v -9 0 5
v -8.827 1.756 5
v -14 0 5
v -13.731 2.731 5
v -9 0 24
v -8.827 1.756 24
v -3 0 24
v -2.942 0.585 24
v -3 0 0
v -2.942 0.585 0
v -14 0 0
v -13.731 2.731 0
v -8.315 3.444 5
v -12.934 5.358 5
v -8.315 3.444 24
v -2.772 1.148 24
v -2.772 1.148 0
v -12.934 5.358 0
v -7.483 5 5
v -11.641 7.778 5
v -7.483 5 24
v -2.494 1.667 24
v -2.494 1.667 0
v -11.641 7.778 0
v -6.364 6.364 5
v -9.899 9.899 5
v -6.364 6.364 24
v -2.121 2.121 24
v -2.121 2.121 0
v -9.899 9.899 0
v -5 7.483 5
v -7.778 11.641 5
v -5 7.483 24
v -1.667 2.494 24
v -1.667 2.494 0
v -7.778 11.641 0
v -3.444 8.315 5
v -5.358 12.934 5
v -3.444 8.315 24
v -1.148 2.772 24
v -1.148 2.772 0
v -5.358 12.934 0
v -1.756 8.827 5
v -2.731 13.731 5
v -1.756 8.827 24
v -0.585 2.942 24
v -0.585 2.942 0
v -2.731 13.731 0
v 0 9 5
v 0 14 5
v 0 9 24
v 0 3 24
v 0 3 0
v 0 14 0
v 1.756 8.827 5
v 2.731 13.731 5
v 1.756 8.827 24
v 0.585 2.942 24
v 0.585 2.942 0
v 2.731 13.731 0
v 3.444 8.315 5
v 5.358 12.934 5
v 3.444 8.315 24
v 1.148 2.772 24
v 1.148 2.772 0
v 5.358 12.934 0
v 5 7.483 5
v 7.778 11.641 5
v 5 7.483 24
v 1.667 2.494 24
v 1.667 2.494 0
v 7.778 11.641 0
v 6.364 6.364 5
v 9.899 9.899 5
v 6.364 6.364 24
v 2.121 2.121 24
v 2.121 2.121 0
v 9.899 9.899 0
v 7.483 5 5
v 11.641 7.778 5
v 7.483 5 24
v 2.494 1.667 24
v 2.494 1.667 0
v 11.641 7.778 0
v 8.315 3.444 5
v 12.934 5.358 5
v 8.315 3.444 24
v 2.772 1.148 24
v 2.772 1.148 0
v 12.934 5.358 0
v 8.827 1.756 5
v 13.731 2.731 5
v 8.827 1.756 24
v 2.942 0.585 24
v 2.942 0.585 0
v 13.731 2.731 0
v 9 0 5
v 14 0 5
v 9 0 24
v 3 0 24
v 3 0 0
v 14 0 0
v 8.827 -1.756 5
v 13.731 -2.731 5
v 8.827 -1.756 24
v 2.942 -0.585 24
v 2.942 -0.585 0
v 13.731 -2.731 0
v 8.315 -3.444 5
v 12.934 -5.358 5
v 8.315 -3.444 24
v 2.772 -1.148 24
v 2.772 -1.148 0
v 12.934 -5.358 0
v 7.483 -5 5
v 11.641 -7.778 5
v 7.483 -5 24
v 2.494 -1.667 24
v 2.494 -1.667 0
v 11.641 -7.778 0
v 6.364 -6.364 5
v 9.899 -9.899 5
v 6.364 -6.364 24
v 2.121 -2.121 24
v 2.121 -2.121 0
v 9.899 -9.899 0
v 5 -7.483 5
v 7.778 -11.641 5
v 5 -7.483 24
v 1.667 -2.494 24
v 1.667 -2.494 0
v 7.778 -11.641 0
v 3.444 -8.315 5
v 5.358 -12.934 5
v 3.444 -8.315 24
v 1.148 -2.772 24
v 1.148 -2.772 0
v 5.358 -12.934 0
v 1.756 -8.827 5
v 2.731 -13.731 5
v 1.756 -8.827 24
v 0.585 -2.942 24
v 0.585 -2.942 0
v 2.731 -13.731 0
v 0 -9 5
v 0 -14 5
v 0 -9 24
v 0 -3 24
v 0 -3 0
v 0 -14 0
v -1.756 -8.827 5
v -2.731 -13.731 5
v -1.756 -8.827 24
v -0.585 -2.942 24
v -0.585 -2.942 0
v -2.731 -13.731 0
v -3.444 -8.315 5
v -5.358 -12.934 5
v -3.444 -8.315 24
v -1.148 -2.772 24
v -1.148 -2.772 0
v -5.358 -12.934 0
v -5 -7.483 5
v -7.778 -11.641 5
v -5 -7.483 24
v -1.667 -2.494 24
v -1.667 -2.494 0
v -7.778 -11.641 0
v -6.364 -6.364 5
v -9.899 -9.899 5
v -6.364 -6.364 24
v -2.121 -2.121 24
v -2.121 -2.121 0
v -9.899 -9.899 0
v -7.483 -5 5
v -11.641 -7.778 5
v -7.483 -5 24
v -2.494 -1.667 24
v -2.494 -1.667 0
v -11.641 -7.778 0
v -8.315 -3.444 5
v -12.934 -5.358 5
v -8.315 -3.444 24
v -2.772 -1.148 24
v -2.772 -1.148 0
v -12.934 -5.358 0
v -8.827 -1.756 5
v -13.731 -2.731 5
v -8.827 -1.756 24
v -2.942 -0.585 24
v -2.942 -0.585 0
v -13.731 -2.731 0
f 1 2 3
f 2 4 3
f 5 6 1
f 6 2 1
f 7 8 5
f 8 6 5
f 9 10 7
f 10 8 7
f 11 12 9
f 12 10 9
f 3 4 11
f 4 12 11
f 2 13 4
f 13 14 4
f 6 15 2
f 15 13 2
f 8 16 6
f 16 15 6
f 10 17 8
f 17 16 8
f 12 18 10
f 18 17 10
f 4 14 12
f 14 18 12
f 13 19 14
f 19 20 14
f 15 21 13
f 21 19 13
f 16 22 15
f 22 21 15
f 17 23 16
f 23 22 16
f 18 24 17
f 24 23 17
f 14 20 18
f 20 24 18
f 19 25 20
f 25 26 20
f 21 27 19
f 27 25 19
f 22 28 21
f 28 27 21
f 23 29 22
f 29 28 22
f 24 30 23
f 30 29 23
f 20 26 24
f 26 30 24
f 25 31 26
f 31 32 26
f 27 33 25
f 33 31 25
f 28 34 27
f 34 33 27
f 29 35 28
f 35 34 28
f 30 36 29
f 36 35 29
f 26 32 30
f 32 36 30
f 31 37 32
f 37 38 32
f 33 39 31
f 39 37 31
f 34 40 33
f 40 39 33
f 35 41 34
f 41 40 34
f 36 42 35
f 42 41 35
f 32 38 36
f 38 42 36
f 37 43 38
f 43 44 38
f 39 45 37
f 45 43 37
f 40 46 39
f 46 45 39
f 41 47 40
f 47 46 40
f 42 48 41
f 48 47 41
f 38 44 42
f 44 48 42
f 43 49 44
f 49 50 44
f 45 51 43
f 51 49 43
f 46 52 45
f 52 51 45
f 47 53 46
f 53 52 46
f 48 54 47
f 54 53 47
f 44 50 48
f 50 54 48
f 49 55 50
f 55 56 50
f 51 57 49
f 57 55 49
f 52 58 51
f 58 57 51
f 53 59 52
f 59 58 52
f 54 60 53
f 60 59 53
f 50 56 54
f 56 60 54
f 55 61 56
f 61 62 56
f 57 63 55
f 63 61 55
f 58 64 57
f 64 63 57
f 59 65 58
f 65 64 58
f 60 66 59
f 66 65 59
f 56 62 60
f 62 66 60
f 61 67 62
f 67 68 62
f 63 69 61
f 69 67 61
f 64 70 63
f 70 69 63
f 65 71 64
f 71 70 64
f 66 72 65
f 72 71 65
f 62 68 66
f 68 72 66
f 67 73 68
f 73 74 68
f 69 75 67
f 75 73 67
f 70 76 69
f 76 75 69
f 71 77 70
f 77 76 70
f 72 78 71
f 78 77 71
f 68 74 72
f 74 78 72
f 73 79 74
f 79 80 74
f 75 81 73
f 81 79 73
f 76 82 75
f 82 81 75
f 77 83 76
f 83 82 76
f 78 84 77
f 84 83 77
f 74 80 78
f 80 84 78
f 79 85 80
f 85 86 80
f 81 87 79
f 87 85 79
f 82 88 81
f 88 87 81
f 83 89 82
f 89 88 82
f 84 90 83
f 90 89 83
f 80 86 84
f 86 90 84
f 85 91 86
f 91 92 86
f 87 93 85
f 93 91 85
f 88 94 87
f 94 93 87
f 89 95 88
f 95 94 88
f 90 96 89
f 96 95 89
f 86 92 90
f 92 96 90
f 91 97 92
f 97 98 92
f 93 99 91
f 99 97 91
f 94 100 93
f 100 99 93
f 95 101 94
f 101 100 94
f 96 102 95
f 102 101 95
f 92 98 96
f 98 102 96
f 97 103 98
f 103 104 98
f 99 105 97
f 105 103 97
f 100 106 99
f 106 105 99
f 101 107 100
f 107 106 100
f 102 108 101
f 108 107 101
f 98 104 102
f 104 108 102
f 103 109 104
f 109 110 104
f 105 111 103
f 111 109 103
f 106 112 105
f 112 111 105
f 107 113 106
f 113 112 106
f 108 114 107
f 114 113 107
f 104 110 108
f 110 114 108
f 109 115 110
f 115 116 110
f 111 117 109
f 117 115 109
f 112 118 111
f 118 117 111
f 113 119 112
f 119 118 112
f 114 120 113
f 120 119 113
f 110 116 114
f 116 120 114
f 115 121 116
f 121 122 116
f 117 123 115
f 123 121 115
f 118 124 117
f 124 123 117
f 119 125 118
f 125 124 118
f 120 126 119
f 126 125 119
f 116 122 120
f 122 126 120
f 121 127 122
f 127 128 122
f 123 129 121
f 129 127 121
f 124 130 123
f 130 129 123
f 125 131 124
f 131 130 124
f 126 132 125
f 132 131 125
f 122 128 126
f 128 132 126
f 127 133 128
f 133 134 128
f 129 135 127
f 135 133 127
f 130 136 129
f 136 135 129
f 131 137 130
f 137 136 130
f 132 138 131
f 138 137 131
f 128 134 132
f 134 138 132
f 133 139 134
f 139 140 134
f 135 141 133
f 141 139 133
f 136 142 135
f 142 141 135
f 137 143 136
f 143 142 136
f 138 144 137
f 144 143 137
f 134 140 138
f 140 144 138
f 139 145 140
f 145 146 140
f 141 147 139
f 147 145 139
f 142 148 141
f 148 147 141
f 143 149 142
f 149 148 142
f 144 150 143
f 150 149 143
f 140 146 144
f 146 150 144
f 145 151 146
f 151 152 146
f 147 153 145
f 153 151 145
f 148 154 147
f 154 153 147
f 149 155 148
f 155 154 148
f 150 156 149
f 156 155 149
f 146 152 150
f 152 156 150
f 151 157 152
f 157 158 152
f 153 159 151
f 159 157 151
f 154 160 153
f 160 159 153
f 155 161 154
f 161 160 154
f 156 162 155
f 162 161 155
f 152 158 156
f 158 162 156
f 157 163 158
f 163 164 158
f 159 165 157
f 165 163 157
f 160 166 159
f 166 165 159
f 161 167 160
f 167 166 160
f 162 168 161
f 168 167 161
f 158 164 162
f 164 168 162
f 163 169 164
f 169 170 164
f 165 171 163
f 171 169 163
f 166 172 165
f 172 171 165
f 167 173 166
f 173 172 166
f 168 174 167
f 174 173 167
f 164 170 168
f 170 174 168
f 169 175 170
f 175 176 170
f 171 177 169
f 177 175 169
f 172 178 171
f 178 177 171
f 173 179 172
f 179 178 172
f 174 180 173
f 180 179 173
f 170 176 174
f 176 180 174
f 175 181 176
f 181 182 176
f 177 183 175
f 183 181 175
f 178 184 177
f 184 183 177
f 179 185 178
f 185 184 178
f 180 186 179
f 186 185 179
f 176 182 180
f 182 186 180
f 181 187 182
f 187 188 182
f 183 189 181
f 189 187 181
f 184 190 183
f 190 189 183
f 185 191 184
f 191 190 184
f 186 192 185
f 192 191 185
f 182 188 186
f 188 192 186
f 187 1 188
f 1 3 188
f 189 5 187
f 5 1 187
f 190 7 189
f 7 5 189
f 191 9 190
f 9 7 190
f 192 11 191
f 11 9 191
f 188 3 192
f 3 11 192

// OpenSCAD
$fn = 32;

// ----------------------------------------------------------------------
// Arc stop: collar, 24 mm thick
// ----------------------------------------------------------------------

// --- parameters (mm) ---
revolve_angle = 360;      // full turn around the Z axis
profile_points = 6;       // points of the closed outline

profile = [[3, 0], [14, 0], [14, 5], [9, 5], [9, 24], [3, 24]];  // single closed polygon, 6 points, counter clockwise

// --- the one profile operation ---
rotate_extrude(angle = revolve_angle) polygon(points = profile);
